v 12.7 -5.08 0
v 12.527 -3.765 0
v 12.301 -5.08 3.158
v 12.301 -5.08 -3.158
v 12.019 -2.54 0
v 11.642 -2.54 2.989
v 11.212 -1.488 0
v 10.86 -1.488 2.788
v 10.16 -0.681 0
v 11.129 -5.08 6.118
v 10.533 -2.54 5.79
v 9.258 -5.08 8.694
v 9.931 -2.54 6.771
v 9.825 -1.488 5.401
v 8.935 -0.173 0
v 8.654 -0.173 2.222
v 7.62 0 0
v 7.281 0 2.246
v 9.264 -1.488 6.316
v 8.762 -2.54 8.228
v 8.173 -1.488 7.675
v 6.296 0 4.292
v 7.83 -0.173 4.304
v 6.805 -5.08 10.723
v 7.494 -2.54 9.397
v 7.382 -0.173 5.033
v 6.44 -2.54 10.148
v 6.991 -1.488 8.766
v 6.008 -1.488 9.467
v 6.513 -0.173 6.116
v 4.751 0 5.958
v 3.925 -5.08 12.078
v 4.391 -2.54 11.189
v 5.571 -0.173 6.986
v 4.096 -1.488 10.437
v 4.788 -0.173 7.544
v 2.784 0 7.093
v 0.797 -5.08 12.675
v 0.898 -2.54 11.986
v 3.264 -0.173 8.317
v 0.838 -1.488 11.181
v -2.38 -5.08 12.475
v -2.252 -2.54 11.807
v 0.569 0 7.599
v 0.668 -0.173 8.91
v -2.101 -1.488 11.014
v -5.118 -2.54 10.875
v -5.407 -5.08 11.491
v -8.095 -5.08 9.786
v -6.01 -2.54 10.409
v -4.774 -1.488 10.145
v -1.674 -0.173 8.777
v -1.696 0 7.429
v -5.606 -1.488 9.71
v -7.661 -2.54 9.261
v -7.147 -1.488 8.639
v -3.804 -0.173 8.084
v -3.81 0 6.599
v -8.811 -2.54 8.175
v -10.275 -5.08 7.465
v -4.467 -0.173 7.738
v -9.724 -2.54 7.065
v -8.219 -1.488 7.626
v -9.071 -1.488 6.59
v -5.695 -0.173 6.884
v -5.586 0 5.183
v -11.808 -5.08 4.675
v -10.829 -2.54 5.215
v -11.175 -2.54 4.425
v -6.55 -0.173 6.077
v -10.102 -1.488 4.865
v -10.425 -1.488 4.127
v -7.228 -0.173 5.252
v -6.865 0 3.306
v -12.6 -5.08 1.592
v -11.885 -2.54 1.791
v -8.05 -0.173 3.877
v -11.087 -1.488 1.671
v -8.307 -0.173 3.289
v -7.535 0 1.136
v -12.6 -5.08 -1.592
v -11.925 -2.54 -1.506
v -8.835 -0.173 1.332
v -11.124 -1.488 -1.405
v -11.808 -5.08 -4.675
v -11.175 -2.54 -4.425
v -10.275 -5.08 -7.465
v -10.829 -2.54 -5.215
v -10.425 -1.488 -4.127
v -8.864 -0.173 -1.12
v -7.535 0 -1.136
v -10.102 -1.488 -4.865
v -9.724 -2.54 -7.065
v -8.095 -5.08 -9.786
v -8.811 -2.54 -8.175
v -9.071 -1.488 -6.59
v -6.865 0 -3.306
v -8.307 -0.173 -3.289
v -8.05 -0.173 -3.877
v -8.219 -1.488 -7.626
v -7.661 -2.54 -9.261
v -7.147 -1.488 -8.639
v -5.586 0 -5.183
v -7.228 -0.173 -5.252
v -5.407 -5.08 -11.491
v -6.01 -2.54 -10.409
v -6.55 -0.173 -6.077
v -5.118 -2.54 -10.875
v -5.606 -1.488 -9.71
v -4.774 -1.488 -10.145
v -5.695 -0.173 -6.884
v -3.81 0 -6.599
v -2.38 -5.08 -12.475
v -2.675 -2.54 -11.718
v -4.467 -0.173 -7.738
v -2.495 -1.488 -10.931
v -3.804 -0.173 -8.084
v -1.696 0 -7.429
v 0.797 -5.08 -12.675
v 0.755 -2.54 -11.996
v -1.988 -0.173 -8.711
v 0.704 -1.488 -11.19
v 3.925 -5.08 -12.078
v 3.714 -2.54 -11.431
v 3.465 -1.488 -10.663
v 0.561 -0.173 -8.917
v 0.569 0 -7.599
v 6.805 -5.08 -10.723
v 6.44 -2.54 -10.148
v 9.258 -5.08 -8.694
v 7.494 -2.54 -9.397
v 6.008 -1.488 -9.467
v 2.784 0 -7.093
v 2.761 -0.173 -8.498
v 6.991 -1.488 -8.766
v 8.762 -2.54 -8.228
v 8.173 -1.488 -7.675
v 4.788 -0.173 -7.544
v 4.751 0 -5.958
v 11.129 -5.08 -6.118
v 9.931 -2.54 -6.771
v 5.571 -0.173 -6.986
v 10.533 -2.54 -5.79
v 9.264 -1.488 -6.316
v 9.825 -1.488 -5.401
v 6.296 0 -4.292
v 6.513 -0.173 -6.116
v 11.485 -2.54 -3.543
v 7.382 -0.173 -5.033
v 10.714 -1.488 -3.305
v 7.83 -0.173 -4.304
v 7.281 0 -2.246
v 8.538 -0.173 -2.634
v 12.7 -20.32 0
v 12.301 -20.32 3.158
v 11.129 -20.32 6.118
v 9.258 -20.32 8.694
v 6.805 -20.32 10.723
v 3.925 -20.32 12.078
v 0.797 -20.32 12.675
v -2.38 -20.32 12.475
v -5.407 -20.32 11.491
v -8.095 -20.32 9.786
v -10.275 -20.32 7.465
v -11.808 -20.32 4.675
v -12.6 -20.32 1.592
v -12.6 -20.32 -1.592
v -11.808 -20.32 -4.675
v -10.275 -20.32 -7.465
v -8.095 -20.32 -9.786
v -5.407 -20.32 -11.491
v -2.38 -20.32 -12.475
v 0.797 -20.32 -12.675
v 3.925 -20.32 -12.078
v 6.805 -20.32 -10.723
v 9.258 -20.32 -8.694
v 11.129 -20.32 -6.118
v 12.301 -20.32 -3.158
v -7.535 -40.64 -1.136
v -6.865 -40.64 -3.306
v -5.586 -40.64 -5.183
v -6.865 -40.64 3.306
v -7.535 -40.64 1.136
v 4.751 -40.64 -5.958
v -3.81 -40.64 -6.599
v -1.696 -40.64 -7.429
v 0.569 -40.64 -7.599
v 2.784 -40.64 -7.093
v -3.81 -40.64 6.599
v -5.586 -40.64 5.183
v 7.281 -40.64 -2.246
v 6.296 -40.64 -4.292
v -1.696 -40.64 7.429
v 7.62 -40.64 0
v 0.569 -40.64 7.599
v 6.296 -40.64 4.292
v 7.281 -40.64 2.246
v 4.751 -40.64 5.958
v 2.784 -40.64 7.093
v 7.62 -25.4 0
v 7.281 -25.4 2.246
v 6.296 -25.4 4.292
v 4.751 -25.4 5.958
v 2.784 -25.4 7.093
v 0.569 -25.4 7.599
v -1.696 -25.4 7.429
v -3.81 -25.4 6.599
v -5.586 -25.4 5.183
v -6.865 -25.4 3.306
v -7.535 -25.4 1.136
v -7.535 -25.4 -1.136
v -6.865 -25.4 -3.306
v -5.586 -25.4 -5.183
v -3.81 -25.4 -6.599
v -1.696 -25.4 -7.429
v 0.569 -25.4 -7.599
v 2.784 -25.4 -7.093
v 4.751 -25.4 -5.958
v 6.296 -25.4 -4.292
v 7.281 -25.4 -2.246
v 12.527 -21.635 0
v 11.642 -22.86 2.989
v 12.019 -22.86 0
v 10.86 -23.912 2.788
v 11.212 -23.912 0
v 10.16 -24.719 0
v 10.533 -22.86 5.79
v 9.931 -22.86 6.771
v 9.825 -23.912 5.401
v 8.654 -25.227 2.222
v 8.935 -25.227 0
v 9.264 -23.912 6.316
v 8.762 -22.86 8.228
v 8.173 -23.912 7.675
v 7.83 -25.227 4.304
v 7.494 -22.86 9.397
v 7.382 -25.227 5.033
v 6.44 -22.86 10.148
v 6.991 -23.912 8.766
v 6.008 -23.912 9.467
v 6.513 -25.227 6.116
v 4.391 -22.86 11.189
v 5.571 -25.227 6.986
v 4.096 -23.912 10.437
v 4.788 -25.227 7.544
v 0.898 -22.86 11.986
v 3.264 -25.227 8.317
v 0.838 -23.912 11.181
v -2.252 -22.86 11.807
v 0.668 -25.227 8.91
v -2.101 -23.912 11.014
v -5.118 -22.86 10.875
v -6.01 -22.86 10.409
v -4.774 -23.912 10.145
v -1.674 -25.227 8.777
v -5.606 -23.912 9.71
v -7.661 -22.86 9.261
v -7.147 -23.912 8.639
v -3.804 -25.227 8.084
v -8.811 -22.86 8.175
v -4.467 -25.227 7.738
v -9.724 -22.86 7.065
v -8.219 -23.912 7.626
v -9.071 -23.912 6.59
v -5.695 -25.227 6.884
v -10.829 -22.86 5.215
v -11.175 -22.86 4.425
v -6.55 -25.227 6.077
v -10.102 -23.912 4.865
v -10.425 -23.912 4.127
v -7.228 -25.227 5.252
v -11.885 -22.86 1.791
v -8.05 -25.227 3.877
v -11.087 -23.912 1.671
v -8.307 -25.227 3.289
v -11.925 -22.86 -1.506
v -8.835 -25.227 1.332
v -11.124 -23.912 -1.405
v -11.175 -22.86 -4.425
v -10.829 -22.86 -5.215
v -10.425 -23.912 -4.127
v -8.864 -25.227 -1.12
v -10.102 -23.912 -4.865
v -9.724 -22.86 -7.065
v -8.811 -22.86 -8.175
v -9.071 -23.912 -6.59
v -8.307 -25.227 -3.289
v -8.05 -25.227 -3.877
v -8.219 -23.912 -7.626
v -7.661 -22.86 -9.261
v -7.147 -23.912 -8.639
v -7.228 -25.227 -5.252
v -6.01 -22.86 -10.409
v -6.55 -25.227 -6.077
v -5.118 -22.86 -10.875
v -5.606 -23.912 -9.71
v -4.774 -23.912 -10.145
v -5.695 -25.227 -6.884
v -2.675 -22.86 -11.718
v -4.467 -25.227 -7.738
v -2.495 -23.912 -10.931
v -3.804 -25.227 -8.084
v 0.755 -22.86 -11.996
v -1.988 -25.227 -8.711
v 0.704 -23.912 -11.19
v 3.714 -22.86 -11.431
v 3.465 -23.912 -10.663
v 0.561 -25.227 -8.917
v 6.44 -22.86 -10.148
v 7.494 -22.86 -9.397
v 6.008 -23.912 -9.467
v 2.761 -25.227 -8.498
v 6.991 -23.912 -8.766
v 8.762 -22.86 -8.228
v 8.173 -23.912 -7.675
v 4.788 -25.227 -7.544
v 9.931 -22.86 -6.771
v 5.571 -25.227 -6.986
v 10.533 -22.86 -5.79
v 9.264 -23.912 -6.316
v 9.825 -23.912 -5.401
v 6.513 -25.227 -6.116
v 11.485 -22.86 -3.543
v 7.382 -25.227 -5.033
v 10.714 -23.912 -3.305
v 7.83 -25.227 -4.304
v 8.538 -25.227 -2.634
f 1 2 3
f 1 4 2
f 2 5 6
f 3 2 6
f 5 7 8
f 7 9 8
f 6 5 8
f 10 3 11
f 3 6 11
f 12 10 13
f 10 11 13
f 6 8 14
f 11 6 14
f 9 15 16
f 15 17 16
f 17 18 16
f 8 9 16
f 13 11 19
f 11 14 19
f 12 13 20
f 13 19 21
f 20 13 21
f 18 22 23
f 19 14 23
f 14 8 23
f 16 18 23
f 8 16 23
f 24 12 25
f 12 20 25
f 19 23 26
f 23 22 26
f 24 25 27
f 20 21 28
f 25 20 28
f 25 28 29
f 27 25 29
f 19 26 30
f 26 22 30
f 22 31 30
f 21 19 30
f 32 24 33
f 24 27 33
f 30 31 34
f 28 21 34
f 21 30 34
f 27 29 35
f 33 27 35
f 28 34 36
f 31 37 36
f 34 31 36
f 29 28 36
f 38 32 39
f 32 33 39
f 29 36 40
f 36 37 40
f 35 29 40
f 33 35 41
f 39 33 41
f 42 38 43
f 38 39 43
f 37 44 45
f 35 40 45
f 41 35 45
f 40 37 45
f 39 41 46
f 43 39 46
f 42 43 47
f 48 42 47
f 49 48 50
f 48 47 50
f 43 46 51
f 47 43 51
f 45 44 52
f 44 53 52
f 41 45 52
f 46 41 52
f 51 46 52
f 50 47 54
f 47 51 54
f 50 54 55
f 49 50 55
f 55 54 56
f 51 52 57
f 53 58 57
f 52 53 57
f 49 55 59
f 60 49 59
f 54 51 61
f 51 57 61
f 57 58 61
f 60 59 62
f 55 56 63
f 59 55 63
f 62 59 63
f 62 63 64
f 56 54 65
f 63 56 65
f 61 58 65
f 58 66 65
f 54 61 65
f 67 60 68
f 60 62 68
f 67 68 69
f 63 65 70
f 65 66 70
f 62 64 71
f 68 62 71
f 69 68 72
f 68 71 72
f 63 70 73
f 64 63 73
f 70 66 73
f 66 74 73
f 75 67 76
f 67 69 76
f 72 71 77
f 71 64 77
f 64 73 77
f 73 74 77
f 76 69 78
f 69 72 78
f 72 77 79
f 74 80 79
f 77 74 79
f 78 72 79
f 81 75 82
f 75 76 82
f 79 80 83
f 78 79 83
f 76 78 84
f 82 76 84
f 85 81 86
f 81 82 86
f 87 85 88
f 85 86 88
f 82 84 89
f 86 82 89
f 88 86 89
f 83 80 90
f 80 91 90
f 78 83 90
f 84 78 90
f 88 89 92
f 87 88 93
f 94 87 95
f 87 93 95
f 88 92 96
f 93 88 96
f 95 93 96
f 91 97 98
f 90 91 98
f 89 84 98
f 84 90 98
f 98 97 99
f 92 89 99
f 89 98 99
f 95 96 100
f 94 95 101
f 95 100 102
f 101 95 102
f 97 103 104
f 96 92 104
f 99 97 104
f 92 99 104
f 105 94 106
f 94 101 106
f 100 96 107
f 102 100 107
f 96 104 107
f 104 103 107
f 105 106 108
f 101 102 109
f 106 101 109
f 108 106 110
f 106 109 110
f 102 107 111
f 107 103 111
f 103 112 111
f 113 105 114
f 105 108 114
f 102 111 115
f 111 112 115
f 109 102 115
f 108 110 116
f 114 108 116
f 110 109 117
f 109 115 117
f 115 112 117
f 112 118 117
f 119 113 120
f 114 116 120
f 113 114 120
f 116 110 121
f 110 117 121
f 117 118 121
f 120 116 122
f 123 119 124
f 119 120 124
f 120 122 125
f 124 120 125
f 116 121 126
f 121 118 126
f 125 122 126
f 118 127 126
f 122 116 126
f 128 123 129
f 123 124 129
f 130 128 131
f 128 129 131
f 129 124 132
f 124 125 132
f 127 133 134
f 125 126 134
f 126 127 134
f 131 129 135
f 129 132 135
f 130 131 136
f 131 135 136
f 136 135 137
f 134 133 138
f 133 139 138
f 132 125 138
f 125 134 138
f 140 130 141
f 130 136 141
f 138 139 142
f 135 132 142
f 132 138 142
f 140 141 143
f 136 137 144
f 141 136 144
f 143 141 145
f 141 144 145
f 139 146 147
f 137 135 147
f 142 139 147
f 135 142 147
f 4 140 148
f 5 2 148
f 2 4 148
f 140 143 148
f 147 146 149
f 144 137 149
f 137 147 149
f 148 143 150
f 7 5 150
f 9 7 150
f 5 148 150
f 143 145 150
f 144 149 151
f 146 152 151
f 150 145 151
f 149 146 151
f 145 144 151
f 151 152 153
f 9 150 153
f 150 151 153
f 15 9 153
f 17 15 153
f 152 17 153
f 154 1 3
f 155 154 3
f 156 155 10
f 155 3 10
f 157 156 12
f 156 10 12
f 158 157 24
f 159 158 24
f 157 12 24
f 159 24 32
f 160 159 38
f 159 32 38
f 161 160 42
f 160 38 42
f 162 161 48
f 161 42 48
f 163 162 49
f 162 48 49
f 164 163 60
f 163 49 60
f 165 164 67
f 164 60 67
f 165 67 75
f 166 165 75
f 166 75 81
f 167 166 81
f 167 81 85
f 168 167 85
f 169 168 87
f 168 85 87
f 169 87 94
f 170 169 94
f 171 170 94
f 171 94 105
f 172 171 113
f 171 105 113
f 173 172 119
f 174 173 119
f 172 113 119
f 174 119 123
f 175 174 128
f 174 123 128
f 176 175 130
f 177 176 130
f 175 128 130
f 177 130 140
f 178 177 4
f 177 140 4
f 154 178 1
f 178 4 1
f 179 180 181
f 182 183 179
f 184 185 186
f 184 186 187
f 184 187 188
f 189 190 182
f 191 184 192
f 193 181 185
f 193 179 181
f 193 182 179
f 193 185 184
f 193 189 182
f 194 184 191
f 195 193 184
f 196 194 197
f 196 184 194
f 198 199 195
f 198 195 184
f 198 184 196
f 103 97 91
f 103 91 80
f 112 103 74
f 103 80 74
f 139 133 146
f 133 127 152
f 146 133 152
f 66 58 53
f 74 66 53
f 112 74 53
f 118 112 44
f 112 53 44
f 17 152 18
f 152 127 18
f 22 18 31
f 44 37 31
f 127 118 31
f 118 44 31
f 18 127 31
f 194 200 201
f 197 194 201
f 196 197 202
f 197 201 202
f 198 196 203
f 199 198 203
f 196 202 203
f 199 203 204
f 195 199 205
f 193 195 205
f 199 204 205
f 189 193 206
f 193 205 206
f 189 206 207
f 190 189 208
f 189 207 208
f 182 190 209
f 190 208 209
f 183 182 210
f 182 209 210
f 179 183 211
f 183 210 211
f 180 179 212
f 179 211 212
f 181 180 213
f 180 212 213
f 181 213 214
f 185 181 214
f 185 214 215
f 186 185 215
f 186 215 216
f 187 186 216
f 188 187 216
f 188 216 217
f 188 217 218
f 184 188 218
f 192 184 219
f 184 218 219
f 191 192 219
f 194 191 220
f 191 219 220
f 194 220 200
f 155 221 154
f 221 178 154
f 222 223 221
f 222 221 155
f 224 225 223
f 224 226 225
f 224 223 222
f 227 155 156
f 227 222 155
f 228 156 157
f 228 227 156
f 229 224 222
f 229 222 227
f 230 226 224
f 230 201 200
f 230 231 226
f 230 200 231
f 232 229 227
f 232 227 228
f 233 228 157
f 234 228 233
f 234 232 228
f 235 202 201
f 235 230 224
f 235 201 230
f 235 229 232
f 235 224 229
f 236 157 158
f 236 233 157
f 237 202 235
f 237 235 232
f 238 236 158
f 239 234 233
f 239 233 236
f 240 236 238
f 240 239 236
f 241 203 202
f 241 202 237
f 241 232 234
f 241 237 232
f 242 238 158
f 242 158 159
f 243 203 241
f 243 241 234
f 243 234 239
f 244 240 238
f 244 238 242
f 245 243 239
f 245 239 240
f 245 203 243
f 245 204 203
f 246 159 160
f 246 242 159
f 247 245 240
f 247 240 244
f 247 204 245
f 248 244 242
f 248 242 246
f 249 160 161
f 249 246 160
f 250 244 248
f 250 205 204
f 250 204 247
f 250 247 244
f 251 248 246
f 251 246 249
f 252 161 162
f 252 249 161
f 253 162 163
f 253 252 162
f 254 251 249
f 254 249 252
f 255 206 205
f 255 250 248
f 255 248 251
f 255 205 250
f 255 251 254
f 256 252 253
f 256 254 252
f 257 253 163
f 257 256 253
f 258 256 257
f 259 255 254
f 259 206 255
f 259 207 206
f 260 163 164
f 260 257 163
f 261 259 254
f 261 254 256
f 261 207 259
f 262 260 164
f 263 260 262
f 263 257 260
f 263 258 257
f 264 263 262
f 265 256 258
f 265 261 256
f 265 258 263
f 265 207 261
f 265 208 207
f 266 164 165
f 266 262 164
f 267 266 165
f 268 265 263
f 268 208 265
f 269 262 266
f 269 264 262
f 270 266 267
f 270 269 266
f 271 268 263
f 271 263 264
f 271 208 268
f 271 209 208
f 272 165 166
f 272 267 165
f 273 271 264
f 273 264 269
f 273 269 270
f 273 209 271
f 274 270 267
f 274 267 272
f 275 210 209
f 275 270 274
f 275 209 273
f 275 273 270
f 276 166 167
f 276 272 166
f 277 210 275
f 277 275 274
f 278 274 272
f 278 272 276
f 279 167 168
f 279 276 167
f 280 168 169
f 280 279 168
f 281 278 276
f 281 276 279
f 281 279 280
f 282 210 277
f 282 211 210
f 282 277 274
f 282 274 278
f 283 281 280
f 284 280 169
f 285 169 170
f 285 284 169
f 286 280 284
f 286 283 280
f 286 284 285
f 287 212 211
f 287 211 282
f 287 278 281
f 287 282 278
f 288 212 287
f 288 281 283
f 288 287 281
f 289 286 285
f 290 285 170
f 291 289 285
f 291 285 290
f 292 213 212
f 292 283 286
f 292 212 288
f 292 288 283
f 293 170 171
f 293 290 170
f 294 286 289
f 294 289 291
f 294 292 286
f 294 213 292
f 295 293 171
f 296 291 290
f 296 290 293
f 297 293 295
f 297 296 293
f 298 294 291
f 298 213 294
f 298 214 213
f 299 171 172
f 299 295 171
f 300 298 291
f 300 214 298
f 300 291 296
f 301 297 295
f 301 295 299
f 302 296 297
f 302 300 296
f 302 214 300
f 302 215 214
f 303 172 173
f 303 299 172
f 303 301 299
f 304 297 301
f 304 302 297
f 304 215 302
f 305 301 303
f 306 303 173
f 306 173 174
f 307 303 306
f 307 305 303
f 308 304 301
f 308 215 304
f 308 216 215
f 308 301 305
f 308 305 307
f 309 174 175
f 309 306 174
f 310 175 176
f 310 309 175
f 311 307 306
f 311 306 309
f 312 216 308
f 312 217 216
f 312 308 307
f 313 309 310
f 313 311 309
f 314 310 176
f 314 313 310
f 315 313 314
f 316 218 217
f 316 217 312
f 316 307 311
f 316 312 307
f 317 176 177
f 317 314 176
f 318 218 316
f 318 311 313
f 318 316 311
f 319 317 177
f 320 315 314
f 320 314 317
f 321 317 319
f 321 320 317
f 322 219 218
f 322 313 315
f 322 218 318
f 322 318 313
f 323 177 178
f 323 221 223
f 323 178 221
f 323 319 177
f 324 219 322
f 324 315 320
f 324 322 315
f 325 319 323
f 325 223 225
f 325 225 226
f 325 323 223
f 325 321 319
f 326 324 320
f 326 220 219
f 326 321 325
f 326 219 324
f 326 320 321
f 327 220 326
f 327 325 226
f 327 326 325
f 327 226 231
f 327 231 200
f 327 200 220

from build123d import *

# Parameters (mm, degrees)
F0_R      = 12.7
F1_DEPTH  = 25.4
F2_R      = 5.08
F3_R      = 6.35
F1_FACE_R = 7.62
F4_DEPTH  = 15.24


with BuildPart() as f1:
    # F0 (on Front) → F1 (new body)
    with BuildSketch(Plane.XZ):
        Circle(F0_R)
    extrude(amount=F1_DEPTH)

    # F2
    f2_edges = [f1.edges().sort_by_distance(p)[0] for p in [
        (-12.7, -25.4, 0),
        (-12.7, 0, 0),
    ]]
    fillet(f2_edges, radius=F2_R)

    # F3 (on Front) + F1_face (on face) → F4 (join)
    with BuildSketch(Plane.XZ):
        Circle(F3_R)
    with BuildSketch(Plane.XZ.offset(25.4)):
        Circle(F1_FACE_R)
    extrude(amount=F4_DEPTH)


solid = f1.part
